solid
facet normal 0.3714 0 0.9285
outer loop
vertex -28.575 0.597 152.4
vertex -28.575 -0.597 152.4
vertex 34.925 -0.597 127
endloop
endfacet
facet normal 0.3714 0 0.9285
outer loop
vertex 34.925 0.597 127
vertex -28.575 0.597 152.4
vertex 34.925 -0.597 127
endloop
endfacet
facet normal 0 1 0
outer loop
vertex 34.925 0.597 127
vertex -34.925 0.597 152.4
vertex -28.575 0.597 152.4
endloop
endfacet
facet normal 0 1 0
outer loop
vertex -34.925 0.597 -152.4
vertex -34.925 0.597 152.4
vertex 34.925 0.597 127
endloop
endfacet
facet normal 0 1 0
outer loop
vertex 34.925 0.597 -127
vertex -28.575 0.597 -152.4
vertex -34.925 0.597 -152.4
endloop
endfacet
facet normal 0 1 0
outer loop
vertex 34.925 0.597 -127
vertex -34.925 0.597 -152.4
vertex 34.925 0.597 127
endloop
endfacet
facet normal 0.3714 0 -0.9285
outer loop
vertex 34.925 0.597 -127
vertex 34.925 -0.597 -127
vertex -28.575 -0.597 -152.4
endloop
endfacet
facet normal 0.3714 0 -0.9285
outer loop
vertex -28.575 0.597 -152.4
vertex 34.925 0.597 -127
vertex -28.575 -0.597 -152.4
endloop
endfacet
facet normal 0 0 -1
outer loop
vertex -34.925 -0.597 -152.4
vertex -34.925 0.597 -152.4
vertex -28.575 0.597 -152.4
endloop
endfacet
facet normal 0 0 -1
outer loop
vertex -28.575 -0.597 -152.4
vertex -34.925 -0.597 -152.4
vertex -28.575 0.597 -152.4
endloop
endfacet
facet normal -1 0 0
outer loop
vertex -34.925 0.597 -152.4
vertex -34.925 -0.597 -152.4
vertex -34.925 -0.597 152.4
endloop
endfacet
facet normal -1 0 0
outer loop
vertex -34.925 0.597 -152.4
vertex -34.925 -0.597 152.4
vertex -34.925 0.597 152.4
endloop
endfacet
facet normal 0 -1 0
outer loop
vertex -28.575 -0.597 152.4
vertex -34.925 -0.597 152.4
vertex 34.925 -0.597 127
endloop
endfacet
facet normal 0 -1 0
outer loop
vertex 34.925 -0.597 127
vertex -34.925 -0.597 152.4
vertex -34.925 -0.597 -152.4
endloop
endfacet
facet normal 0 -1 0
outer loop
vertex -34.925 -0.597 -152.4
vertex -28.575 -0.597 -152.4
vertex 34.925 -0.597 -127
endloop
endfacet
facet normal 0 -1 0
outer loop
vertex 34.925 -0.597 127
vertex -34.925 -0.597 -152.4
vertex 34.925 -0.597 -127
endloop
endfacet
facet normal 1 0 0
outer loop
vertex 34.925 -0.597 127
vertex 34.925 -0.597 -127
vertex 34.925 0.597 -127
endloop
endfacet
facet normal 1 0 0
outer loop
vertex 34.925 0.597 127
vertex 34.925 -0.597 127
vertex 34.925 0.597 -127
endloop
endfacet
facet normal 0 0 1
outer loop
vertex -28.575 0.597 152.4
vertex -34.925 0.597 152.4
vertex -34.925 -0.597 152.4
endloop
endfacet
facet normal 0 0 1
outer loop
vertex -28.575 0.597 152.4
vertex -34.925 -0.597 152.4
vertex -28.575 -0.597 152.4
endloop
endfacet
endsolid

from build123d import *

# Parameters (mm, degrees)
BOSS_EXTRUDE1_DEPTH      = 152.4
BOSS_EXTRUDE1_DEPTH_BACK = 152.4
SKETCH3_W                = 69.85
SKETCH3_H                = 1.1938
SKETCH5_OUTSIDE_W        = 134.39
SKETCH5_OUTSIDE_H        = 369.34
CUT_EXTRUDE2_DEPTH       = 157.355175109


with BuildPart() as part:
    # Sketch3 → Boss-Extrude1 (new, two sides: drawn at the far end of the back side and taken through both)
    with BuildSketch(Plane.XY.offset(-BOSS_EXTRUDE1_DEPTH_BACK)):
        Rectangle(SKETCH3_W, SKETCH3_H)
    extrude(amount=BOSS_EXTRUDE1_DEPTH + BOSS_EXTRUDE1_DEPTH_BACK)

    # Sketch5 outside → Cut-Extrude2 (cut, through all)
    with BuildSketch(Plane.XZ.offset(0.5969)):
        Rectangle(SKETCH5_OUTSIDE_W, SKETCH5_OUTSIDE_H)
        Polygon((-28.575, 152.4), (34.925, 127), (34.925, -127), (-28.575, -152.4), (-34.925, -152.4), (-34.925, 152.4), align=None, mode=Mode.SUBTRACT)
    extrude(amount=-CUT_EXTRUDE2_DEPTH, mode=Mode.SUBTRACT)


solid = part.part
